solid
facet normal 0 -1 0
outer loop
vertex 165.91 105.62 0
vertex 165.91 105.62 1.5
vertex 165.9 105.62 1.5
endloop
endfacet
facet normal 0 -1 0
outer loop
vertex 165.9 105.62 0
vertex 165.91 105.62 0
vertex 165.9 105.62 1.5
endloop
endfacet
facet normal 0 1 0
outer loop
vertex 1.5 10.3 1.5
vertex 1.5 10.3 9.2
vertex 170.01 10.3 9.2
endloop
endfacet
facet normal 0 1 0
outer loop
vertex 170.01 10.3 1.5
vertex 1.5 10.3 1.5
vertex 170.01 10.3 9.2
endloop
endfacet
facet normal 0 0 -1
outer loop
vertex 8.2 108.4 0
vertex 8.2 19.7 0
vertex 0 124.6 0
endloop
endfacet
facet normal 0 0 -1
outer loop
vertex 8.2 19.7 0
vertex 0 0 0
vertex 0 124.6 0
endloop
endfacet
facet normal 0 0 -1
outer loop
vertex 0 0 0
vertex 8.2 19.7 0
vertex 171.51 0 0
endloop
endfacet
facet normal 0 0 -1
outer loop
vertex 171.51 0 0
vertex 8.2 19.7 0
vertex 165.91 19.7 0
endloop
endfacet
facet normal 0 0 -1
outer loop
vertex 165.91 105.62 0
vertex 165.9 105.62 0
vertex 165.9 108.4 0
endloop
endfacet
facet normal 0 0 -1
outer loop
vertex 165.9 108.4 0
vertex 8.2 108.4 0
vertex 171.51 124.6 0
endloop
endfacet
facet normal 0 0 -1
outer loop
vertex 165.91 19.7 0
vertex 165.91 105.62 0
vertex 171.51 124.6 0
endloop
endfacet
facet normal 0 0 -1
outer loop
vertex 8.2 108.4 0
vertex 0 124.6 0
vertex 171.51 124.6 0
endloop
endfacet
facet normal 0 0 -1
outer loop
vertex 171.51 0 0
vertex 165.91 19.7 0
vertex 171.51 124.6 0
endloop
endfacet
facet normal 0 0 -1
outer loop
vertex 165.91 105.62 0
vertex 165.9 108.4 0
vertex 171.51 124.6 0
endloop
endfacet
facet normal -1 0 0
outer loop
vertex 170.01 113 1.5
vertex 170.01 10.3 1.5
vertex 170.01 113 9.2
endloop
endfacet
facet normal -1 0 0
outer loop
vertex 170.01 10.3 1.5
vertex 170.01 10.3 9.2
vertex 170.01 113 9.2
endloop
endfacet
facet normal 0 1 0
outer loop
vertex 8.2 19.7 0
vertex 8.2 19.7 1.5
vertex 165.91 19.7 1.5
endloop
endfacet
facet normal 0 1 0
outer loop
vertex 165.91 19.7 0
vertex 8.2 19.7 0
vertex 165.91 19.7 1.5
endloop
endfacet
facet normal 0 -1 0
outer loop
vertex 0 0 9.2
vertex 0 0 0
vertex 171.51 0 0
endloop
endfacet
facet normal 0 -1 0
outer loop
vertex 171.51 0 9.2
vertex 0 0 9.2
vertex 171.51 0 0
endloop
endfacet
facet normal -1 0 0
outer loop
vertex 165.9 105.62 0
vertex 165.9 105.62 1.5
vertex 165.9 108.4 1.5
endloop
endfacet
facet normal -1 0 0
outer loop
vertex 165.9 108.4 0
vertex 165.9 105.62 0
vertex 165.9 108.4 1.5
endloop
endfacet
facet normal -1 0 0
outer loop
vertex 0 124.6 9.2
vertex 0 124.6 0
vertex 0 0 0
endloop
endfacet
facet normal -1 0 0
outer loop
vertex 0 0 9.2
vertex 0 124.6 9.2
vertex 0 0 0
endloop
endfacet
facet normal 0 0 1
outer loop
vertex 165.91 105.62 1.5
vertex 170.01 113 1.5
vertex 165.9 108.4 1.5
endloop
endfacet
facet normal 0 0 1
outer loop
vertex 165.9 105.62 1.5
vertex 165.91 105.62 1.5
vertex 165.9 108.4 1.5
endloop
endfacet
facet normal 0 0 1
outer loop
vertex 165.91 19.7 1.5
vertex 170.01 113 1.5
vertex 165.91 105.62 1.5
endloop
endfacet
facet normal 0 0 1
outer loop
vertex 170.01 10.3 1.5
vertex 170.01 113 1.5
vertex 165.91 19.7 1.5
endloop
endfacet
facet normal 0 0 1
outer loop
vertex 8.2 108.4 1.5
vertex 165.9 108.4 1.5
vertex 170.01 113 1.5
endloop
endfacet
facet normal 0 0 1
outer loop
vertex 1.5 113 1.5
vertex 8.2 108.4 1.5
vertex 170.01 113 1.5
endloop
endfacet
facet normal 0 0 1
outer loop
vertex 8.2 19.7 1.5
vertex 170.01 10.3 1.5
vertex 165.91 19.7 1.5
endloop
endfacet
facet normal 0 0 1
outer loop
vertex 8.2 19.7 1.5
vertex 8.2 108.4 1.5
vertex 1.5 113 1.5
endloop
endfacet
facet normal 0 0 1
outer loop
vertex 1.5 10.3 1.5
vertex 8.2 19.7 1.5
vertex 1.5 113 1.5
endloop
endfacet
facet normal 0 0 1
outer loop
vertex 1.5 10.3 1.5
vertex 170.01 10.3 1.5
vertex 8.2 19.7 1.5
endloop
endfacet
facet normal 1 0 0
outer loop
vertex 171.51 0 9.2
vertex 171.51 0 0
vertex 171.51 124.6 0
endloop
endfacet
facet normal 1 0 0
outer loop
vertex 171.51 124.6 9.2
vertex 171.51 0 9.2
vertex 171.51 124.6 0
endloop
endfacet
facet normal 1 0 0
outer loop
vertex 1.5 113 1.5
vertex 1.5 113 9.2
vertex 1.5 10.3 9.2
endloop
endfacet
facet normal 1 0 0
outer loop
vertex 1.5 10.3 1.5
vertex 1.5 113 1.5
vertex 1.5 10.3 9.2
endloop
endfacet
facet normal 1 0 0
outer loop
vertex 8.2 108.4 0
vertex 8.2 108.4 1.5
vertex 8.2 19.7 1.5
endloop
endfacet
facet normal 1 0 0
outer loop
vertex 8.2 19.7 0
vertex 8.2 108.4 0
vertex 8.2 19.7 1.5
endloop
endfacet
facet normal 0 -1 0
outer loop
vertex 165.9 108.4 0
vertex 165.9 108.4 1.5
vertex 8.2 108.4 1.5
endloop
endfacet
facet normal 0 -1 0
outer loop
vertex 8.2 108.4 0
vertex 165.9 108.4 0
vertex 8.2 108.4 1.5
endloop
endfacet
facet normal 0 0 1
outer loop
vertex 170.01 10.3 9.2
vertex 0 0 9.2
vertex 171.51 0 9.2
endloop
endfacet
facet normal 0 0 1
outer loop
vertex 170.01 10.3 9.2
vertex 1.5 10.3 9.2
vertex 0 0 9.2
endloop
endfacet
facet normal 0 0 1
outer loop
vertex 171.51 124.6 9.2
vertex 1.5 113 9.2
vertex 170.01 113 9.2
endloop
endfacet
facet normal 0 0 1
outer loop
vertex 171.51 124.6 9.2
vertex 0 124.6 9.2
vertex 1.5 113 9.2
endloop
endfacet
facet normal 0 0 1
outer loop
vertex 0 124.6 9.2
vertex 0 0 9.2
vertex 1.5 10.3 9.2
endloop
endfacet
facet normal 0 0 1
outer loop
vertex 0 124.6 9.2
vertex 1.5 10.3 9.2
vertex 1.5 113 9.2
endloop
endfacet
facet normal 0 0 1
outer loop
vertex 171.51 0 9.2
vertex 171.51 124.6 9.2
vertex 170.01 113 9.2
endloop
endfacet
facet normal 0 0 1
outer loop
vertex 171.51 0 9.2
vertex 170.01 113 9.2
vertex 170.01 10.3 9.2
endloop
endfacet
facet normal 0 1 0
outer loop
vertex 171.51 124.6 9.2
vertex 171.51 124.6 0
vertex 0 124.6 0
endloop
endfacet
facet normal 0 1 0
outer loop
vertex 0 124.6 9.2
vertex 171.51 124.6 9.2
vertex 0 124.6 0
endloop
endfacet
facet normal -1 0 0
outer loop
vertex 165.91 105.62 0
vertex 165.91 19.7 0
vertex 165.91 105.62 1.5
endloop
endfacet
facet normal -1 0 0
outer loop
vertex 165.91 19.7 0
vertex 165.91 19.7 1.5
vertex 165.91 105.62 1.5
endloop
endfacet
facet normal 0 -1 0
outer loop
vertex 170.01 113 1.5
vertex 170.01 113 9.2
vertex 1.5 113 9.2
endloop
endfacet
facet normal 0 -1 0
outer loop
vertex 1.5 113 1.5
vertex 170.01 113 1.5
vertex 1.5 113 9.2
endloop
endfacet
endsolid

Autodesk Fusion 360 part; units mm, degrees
sketch "Sketch1" plane through (0, 0, 0) normal (0, 0, 1) x (1, 0, 0)
  line L0 (0, 0) -> (169.51, 0)
  line L1 (169.51, 0) -> (169.51, 124.6)
  line L2 (169.51, 124.6) -> (0, 124.6)
  line L3 (0, 124.6) -> (0, 0)
  dimension "d1" = 169.51
  dimension "d2" = 124.6
extrude "Extrude1" add sketch "Sketch1" along normal blind 9.2 makes body 1
sketch "Sketch2" plane through (0, 0, 9.2) normal (0, 0, 1) x (-1, 0, 0)
  line L0 (0, -124.6) -> (0, 0)
  line L1 (0, 0) -> (-169.51, 0)
  line L2 (-169.51, 0) -> (-169.51, -124.6)
  line L3 (-169.51, -124.6) -> (0, -124.6)
  line L4 (-1.5, -10.3) -> (-168.01, -10.3)
  line L5 (-168.01, -10.3) -> (-168.01, -113)
  line L6 (-168.01, -113) -> (-1.5, -113)
  line L7 (-1.5, -113) -> (-1.5, -10.3)
  dimension "d5" = 1.5
  dimension "d6" = 1.5
  dimension "d7" = 11.6
  dimension "d8" = 10.3
extrude "Extrude2" cut sketch "Sketch2" against normal blind 7.6 contours L4 L5 L6 L7 bodies 1
sketch "Sketch3" plane through (0, 0, 1.6) normal (0, 0, 1) x (-1, 0, 0)
  line L0 (-1.5, -113) -> (-1.5, -10.3)
  line L1 (-1.5, -10.3) -> (-168.01, -10.3)
  line L2 (-168.01, -10.3) -> (-168.01, -113)
  line L3 (-168.01, -113) -> (-1.5, -113)
  line L4 (-8.2, -19.7) -> (-163.91, -19.7)
  line L5 (-163.91, -19.7) -> (-163.91, -105.62)
  line L6 (-163.91, -105.62) -> (-8.2, -105.62)
  line L7 (-8.2, -105.62) -> (-8.2, -19.7)
  dimension "d12" = 85.92
  dimension "d13" = 9.4
  dimension "d14" = 6.7
  dimension "d15" = 4.1
extrude "Extrude3" cut sketch "Sketch3" against normal blind 1.6 contours L4 L5 L6 L7 bodies 1
extrude "Extrude4" cut 1 faces at (59.2367, 13.4333, 1.6) along direction (0, 0, -1) blind 0.1 on bodies 1 bodies 1
sketch "Sketch4" plane through (0, 0, 1.5) normal (0, 0, 1) x (-1, 0, 0)
  line L0 (-163.91, -19.7) -> (-8.2, -19.7)
  line L1 (-8.2, -19.7) -> (-8.2, -105.62)
  line L2 (-8.2, -105.62) -> (-163.91, -105.62)
  line L3 (-163.91, -105.62) -> (-163.91, -19.7)
  line L4 (-1.5, -113) -> (-1.5, -10.3)
  line L5 (-1.5, -10.3) -> (-168.01, -10.3)
  line L6 (-168.01, -10.3) -> (-168.01, -113)
  line L7 (-168.01, -113) -> (-1.5, -113)
  line L8 (-8.2, -105.62) -> (-163.9, -105.62)
  line L9 (-163.9, -105.62) -> (-163.9, -108.4)
  line L10 (-163.9, -108.4) -> (-8.2, -108.4)
  line L11 (-8.2, -108.4) -> (-8.2, -105.62)
  dimension "d20" = 4.6
  dimension "d21" = 155.7
extrude "Extrude5" cut sketch "Sketch4" against normal blind 1.5 contours L2 L8 L9 L10 L11 bodies 1
ref_plane "WorkPlane1" through (90, 0, 0) normal (1, 0, 0) x (0, 1, 0)
split "Split1" by plane through (90, 0, 0) normal (1, 0, 0) bodies 1 makes body 2 at (141.14, 6.5667, 0)
move_body "Move1" bodies 2 to x (1, 0, 0) y (0, 1, 0) z (0, 0, 1) at (2, 0, 0)
extrude "Extrude6" add 2 faces at (90, 3.4333, 3.5667) (90, 120.7333, 3.5667) along direction (1, 0, 0) blind 2 on bodies 1 bodies 1 2
